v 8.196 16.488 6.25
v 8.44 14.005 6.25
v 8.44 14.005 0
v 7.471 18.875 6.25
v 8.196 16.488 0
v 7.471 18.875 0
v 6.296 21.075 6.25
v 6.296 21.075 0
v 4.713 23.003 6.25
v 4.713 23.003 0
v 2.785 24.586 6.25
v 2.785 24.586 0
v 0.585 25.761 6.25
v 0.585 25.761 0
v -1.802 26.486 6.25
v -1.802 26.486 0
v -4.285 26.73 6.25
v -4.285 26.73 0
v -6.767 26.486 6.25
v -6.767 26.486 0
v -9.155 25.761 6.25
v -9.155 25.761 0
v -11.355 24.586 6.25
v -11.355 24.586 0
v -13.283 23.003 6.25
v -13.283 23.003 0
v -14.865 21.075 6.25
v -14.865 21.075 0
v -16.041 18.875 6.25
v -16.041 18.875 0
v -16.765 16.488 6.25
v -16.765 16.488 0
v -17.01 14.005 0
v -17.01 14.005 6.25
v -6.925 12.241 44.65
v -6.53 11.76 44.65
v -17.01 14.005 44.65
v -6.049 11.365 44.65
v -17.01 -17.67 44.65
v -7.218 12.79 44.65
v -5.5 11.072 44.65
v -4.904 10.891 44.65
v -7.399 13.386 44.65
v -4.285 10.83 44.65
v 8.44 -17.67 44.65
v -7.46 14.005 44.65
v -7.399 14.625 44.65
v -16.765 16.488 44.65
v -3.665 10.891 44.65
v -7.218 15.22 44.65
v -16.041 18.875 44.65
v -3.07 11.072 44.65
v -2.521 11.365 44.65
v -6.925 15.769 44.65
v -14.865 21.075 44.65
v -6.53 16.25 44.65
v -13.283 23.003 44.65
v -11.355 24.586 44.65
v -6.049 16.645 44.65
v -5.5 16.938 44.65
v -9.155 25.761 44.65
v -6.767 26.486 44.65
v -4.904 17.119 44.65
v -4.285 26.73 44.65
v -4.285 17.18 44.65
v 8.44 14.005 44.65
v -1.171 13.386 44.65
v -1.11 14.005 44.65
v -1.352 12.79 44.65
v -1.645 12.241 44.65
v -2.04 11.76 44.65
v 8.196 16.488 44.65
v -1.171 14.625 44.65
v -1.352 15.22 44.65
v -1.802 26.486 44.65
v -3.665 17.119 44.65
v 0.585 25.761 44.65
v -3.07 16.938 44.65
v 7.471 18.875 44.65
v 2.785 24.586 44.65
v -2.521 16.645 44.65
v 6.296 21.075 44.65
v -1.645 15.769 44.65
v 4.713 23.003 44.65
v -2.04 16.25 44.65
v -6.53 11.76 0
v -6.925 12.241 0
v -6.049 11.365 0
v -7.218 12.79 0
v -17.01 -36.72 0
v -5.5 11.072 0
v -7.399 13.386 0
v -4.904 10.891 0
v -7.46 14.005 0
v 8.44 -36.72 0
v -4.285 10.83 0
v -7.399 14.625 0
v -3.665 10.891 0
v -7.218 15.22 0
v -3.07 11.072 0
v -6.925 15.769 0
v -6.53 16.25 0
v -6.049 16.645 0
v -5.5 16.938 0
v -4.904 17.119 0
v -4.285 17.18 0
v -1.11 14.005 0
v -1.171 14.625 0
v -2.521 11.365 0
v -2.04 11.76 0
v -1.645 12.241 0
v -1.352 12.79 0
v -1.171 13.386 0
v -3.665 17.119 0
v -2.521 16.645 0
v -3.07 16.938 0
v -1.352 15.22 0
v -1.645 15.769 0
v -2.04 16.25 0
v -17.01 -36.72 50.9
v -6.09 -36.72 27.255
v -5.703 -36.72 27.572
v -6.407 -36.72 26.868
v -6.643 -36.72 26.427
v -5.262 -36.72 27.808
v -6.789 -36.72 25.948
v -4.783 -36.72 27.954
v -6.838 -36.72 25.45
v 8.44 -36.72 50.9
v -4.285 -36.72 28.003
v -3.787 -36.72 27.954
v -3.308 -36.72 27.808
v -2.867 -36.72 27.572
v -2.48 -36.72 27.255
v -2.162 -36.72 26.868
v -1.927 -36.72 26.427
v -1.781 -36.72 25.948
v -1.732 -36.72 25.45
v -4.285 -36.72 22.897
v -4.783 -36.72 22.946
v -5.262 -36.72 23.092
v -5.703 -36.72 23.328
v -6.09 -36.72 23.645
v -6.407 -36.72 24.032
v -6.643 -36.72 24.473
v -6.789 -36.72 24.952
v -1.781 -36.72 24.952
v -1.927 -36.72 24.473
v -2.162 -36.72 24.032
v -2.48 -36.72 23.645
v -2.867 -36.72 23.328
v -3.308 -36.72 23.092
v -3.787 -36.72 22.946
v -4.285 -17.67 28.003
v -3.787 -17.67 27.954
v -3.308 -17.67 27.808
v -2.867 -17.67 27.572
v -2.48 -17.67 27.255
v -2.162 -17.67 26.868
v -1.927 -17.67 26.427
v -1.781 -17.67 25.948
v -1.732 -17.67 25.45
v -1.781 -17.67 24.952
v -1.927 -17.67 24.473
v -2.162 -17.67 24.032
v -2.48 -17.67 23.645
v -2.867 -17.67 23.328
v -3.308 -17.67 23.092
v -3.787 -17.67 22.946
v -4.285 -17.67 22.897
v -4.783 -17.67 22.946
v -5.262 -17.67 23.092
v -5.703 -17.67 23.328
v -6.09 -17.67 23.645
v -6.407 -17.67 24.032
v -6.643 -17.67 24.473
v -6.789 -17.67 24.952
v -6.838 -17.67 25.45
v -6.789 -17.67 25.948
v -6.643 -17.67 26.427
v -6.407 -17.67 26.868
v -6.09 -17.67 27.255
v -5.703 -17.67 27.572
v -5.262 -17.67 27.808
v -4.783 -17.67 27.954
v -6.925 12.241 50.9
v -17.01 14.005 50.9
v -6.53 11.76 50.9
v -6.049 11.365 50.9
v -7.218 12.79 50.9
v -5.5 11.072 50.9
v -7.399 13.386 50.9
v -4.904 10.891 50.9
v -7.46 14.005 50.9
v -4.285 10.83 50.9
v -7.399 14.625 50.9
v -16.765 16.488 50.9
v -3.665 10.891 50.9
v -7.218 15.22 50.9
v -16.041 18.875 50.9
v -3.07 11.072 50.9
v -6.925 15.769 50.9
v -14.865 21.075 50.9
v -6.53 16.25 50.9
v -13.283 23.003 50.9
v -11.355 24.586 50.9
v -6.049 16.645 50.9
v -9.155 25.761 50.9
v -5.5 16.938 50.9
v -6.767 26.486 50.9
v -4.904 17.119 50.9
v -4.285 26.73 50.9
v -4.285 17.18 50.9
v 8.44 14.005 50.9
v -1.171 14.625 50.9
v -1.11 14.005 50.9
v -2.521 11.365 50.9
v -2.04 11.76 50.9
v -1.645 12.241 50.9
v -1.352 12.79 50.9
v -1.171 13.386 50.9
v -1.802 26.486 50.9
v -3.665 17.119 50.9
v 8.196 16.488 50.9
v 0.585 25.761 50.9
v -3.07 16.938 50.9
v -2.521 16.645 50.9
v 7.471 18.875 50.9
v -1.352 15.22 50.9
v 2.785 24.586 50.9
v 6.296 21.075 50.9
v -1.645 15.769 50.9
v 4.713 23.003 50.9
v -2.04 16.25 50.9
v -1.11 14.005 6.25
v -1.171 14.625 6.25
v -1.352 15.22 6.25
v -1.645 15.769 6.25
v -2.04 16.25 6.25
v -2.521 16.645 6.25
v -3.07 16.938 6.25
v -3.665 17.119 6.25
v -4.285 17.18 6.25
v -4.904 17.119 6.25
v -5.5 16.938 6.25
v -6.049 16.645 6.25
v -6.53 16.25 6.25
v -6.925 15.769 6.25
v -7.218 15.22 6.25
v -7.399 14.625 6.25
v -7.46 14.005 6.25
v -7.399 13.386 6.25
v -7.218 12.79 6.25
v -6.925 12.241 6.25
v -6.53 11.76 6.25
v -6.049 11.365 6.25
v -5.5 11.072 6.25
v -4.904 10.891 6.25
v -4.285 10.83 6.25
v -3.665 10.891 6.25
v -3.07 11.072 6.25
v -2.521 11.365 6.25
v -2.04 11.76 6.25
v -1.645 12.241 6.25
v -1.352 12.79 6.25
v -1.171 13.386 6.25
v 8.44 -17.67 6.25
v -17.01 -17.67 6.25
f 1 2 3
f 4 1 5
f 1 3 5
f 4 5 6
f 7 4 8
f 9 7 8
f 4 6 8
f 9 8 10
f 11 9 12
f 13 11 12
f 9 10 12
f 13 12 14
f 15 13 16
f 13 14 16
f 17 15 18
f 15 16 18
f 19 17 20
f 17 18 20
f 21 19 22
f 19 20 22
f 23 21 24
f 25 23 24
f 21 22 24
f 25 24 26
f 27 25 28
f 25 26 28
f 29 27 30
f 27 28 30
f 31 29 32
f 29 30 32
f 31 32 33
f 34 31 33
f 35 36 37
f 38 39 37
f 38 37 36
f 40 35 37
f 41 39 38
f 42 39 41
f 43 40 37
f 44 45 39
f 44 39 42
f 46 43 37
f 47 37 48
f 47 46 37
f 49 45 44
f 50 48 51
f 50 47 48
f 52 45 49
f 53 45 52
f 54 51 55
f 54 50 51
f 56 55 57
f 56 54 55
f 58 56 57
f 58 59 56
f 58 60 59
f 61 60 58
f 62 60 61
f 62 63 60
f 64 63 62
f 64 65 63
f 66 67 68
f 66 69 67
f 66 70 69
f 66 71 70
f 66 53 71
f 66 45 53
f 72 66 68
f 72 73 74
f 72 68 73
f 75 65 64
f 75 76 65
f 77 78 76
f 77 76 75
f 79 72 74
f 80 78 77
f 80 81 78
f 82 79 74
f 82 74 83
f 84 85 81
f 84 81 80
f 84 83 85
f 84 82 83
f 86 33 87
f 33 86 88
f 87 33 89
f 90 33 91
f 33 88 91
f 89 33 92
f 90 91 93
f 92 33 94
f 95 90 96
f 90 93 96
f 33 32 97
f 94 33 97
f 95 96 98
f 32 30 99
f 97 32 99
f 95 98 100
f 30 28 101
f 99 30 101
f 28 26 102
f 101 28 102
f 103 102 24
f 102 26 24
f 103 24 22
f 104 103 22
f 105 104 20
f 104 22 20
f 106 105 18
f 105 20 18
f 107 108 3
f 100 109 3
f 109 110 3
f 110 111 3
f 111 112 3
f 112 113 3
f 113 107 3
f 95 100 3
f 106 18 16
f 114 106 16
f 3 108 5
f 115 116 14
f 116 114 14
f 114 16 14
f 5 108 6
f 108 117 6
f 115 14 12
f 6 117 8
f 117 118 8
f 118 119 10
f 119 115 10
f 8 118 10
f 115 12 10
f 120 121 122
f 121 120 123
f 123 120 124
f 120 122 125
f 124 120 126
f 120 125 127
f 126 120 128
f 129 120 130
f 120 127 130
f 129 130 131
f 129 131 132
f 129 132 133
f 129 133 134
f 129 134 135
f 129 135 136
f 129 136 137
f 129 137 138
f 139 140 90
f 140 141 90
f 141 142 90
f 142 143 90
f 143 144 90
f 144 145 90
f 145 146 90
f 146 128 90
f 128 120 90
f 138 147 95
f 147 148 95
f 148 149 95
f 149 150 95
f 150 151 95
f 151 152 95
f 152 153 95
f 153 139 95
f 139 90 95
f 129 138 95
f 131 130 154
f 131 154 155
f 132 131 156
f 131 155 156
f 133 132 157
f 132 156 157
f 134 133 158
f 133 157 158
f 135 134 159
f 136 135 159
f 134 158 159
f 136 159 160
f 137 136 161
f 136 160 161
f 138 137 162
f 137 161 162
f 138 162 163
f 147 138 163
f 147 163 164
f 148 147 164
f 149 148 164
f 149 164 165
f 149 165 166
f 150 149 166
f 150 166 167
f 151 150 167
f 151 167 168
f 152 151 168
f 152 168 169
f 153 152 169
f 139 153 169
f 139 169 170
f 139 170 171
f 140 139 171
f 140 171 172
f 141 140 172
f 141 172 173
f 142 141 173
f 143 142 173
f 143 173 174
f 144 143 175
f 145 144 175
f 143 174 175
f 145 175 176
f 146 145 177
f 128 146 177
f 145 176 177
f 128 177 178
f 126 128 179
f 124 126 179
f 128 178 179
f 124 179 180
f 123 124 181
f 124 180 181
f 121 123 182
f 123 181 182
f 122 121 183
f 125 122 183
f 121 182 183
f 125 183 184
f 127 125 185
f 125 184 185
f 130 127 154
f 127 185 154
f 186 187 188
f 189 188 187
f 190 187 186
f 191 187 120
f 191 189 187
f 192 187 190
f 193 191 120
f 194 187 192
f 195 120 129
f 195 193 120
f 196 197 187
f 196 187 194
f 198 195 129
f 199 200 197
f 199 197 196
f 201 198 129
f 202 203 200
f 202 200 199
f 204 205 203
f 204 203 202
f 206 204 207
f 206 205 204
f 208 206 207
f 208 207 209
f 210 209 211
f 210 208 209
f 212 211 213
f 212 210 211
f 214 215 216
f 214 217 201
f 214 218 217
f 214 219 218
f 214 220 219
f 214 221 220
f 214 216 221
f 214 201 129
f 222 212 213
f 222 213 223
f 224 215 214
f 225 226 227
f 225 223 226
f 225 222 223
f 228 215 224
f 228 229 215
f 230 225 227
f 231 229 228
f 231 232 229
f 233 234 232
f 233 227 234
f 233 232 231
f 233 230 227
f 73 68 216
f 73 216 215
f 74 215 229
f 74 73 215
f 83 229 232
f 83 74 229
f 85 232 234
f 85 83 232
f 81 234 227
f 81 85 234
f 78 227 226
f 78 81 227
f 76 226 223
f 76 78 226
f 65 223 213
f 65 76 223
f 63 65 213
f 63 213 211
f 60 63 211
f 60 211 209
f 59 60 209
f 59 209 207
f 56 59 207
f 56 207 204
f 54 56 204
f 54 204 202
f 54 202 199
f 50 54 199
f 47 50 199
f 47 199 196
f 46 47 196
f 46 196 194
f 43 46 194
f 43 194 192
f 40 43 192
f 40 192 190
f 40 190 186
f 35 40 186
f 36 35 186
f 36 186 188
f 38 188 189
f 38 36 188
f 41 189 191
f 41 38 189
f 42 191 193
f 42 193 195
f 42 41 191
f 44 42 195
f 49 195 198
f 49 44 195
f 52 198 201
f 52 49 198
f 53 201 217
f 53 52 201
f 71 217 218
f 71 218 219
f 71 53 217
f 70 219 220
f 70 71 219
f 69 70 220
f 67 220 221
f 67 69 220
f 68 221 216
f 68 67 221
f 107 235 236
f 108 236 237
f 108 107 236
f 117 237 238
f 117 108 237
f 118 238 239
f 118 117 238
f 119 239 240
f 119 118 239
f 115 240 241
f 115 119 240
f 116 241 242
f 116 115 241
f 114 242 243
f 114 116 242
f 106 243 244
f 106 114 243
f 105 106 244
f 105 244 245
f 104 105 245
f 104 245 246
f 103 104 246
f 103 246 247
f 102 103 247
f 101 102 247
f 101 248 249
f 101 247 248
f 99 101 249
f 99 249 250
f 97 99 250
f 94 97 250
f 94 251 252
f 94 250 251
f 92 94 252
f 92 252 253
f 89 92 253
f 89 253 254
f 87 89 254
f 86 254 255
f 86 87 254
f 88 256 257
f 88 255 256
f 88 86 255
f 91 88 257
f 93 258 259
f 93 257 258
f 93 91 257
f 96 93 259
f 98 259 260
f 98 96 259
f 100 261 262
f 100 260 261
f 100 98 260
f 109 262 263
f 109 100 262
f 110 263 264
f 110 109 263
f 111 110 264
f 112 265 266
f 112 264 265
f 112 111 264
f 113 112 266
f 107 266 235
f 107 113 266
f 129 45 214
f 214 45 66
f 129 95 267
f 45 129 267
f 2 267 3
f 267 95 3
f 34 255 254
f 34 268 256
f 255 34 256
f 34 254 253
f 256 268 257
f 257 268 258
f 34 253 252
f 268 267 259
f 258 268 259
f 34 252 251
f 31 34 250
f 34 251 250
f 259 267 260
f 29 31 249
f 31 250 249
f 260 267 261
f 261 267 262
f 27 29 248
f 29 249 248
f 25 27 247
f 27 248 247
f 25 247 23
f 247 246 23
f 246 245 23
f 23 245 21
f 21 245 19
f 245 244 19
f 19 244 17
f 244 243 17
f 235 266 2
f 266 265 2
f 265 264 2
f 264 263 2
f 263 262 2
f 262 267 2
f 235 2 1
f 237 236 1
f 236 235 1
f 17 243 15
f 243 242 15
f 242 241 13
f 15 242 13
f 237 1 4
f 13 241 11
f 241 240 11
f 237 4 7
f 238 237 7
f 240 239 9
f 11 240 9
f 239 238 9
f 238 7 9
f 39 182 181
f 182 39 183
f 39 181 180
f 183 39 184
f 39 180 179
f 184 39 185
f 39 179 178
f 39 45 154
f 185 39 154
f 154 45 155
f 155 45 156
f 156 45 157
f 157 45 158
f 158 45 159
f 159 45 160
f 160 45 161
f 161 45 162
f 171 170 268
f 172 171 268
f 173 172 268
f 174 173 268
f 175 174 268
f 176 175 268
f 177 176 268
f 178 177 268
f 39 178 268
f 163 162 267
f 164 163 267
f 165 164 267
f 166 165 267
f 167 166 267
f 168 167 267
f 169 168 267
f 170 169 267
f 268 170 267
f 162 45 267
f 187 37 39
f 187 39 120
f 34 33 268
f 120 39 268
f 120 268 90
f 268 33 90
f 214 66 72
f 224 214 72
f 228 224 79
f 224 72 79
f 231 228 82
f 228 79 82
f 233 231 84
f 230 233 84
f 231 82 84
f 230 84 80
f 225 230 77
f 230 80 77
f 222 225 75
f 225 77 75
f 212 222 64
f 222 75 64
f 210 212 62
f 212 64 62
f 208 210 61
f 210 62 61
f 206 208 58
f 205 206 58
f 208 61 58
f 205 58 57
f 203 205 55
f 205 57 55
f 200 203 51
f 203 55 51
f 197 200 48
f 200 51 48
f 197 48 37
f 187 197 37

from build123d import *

# Parameters (mm, degrees)
SKETCH3_R               = 3.175
BOSS_EXTRUDE2_DEPTH     = 50.9
SKETCH7_W               = 38.4
SKETCH7_H               = 44.4
CUT_EXTRUDE1_DEPTH      = 26.45
F_1_4_20_TAPPED_HOLE1_D = 5.1054


with BuildPart() as part:
    # Sketch3 → Boss-Extrude2 (new body)
    with BuildSketch(Plane.XY):
        with BuildLine():
            Line((-17.009907165, -36.719884412), (8.440092835, -36.719884412))
            Line((8.440092835, -36.719884412), (8.440092835, 14.005115588))
            ThreePointArc((8.440092835, 14.005115588), (-4.284907165, 26.730115588), (-17.009907165, 14.005115588))
            Line((-17.009907165, 14.005115588), (-17.009907165, -36.719884412))
        make_face()
        with Locations((-4.284907165, 14.005115588)):
            Circle(SKETCH3_R, mode=Mode.SUBTRACT)
    extrude(amount=BOSS_EXTRUDE2_DEPTH)

    # Sketch7 → Cut-Extrude1 (cut, through all)
    with BuildSketch(Plane(origin=(8.440092835, 0, 0), x_dir=(0, 0, -1), z_dir=(1, 0, 0))):
        with Locations((-25.45, 4.530115588)):
            Rectangle(SKETCH7_W, SKETCH7_H)
    extrude(amount=-CUT_EXTRUDE1_DEPTH, mode=Mode.SUBTRACT)

    # 1/4-20 Tapped Hole1 (through all)
    with Locations(Plane(origin=(-4.284907165, -36.719884412, 25.45), x_dir=(0, 0, -1), z_dir=(0, -1, 0))):
        with Locations((0, 0)):
            Hole(F_1_4_20_TAPPED_HOLE1_D / 2)


solid = part.part
